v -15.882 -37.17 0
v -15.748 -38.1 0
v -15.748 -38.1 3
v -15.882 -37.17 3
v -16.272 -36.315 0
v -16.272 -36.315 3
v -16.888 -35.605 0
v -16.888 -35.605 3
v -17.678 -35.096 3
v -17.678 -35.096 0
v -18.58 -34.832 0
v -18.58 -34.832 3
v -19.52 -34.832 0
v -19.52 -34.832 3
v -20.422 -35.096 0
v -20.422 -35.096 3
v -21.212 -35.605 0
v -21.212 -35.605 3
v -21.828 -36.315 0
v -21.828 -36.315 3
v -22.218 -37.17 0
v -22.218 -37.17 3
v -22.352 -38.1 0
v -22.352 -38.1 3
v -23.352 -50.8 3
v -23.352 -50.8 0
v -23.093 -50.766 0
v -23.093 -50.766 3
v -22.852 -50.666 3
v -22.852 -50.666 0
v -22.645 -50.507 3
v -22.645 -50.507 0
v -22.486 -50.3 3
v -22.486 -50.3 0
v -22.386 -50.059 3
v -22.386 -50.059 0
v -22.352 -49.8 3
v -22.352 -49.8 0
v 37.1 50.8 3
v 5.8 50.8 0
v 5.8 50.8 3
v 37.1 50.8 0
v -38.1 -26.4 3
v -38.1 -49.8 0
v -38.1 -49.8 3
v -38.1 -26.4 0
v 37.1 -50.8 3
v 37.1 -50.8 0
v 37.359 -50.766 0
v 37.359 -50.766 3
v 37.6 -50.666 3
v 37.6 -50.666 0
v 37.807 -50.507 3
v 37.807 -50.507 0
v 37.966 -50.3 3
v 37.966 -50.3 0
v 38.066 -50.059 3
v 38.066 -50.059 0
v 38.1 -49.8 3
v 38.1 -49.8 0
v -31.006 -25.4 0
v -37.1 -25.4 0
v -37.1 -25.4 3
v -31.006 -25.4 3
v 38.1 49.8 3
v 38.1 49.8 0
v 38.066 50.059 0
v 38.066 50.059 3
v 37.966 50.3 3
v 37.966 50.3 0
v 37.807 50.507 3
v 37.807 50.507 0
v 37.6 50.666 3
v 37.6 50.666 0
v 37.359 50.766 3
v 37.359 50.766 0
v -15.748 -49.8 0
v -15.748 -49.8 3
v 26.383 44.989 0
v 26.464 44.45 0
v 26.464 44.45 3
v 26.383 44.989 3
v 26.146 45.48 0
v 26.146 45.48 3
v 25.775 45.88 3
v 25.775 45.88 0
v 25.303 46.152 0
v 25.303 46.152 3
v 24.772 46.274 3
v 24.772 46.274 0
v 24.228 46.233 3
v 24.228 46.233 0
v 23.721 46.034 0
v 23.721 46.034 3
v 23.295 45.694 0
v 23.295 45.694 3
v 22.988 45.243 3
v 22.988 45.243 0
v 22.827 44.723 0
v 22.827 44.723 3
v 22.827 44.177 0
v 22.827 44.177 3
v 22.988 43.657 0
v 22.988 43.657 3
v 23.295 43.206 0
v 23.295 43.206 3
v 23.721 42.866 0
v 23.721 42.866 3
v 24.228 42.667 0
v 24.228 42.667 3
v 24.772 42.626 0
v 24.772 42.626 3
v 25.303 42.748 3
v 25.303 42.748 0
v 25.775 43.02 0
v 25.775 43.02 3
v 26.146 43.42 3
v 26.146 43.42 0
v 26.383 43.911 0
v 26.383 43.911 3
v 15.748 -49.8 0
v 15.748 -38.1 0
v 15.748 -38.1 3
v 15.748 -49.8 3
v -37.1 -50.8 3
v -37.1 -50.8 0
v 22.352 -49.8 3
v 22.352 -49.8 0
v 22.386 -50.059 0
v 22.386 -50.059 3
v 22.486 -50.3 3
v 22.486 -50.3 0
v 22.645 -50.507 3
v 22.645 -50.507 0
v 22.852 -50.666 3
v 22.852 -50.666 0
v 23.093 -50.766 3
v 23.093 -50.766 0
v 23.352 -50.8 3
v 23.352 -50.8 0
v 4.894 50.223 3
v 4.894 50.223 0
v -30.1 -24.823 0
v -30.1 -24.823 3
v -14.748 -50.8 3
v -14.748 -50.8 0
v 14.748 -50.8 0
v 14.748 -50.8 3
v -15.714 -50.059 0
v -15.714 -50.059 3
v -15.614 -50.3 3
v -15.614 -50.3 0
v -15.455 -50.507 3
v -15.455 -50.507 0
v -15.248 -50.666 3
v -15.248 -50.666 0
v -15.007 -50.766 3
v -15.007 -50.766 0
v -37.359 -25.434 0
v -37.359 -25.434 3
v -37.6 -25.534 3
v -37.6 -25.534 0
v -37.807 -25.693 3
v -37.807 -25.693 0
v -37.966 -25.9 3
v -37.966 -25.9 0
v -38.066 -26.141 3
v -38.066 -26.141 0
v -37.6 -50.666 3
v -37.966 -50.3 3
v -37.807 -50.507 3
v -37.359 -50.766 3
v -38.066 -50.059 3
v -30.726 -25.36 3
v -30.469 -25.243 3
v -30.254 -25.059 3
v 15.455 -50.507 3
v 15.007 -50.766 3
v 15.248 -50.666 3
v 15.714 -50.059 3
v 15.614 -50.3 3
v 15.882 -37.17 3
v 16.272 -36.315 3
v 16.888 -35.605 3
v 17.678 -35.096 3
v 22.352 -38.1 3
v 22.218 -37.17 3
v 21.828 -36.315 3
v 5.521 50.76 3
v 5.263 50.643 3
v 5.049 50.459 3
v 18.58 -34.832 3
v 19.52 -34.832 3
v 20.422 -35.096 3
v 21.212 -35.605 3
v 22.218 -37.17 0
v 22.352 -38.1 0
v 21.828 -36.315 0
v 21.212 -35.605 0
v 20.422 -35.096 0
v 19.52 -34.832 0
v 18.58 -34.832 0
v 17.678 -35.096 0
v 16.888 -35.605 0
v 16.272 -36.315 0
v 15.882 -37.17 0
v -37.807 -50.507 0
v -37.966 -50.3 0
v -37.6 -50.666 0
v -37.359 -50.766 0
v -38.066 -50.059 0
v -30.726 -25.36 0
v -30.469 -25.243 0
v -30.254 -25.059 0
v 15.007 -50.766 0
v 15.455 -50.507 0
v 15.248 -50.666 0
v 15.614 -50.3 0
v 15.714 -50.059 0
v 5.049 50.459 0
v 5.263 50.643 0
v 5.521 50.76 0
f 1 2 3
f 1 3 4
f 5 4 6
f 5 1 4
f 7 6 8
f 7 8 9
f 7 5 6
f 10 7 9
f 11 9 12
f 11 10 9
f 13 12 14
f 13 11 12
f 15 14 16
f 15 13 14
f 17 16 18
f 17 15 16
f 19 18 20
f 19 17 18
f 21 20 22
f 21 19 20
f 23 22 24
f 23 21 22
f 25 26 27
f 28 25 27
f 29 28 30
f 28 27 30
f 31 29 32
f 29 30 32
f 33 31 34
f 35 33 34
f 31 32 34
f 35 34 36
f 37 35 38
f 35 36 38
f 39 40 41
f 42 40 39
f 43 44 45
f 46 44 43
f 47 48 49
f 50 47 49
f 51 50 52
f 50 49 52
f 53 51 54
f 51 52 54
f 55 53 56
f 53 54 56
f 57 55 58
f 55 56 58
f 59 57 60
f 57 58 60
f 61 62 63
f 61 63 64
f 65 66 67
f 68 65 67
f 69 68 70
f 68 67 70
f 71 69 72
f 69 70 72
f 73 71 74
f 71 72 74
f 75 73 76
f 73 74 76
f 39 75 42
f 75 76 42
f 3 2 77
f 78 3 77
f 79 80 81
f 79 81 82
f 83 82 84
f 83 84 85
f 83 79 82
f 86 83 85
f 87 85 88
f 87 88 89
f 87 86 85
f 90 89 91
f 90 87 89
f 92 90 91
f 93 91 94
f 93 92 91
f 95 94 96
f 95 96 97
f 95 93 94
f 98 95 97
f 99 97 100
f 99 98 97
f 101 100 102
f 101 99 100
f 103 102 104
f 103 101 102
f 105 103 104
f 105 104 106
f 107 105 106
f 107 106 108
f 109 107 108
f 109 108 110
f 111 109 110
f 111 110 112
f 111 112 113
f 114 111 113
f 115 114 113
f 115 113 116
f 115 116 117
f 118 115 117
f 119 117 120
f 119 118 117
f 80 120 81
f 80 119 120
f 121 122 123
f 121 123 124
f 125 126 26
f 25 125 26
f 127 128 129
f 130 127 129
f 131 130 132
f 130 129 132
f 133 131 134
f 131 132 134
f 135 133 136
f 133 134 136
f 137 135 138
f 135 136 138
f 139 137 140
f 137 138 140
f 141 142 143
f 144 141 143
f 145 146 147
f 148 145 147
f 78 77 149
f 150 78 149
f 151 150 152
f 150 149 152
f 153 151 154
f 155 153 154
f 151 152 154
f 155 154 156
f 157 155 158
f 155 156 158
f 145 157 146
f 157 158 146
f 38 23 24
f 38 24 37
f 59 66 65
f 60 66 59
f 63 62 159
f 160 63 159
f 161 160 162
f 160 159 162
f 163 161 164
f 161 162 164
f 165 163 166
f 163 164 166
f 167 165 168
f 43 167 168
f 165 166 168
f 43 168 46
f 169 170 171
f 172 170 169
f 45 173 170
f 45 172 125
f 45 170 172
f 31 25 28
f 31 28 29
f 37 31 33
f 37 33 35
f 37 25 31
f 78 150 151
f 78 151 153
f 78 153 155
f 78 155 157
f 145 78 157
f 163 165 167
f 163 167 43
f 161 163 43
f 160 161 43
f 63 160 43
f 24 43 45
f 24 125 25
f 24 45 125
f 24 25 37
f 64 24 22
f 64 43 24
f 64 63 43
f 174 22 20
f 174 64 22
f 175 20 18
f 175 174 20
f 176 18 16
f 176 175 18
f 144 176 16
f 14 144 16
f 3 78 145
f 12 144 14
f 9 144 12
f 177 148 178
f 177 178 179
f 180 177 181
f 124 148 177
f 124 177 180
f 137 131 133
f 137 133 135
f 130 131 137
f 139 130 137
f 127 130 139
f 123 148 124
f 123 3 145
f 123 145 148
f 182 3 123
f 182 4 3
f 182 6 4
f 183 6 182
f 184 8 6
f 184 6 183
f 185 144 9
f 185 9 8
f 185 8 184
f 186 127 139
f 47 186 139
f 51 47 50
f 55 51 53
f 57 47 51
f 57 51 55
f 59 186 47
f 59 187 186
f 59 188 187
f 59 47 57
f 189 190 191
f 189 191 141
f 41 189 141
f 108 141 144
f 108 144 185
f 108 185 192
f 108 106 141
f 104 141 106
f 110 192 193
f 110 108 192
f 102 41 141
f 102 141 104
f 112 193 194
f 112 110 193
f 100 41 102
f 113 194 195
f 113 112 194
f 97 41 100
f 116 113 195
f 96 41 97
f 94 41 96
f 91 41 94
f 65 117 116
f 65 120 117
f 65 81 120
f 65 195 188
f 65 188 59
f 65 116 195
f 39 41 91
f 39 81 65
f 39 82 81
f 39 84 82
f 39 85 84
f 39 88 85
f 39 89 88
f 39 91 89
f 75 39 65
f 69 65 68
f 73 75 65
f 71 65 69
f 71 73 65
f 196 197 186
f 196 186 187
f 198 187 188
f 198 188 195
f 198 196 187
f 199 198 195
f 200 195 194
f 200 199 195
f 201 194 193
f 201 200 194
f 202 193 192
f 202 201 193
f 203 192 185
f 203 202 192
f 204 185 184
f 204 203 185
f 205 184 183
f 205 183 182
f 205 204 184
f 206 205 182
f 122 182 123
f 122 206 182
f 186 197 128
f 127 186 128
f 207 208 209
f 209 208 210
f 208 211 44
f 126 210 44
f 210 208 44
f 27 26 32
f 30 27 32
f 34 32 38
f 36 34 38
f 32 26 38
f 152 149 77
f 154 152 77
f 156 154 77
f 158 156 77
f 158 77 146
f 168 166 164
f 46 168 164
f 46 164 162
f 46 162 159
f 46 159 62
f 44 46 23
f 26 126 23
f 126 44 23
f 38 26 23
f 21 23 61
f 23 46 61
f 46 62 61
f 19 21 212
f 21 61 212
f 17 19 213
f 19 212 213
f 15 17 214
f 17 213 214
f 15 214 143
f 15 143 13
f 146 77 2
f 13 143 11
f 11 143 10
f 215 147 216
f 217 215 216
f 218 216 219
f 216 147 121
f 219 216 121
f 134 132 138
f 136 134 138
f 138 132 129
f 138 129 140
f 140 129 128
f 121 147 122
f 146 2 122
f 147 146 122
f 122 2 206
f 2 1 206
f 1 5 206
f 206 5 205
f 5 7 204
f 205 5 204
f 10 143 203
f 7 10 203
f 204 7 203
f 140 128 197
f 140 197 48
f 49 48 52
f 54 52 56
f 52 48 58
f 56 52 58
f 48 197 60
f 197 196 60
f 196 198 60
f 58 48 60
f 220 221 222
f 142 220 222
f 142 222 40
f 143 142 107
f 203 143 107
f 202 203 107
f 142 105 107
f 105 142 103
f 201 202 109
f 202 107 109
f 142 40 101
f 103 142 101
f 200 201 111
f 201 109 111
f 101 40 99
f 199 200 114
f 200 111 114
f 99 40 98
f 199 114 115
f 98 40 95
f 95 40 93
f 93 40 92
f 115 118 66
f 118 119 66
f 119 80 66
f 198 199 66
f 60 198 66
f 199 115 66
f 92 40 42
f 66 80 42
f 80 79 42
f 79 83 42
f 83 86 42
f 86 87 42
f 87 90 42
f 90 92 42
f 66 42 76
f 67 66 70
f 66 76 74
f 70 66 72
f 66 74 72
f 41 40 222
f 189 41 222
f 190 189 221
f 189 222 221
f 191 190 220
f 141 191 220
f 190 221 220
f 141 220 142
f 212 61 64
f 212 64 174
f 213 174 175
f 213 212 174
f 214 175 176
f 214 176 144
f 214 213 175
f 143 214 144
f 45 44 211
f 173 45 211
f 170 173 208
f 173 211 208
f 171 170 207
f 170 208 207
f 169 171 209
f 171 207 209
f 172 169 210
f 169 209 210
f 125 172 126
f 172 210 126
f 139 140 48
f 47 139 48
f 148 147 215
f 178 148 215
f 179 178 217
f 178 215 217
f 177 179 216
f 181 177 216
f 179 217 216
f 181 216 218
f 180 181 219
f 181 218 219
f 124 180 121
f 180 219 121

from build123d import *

# Parameters (mm, degrees)
SKETCH_R  = 1.8288
PAD_DEPTH = 3


with BuildPart() as part:
    # Sketch → Pad (new body)
    with BuildSketch(Plane.XY):
        with BuildLine():
            ThreePointArc((5.800476, 50.8), (5.263177, 50.643391), (4.894168, 50.222618))
            Line((4.894168, 50.222618), (-30.1, -24.822618))
            ThreePointArc((-31.006308, -25.4), (-30.469008, -25.243391), (-30.1, -24.822618))
            Line((-37.1, -25.4), (-31.006308, -25.4))
            ThreePointArc((-37.1, -25.4), (-37.807107, -25.692893), (-38.1, -26.4))
            Line((-38.1, -49.8), (-38.1, -26.4))
            ThreePointArc((-38.1, -49.8), (-37.807107, -50.507107), (-37.1, -50.8))
            Line((-37.1, -50.8), (-23.352, -50.8))
            ThreePointArc((-23.352, -50.8), (-22.644893, -50.507107), (-22.352, -49.8))
            Line((-22.352, -38.1), (-22.352, -49.8))
            ThreePointArc((-15.748, -38.1), (-19.05, -34.798), (-22.352, -38.1))
            Line((-15.748, -38.1), (-15.748, -49.8))
            ThreePointArc((-15.748, -49.8), (-15.455107, -50.507107), (-14.748, -50.8))
            Line((-14.748, -50.8), (14.748, -50.8))
            ThreePointArc((14.748, -50.8), (15.455107, -50.507107), (15.748, -49.8))
            Line((15.748, -38.1), (15.748, -49.8))
            ThreePointArc((22.352, -38.1), (19.05, -34.798), (15.748, -38.1))
            Line((22.352, -38.1), (22.352, -49.8))
            ThreePointArc((22.352, -49.8), (22.644893, -50.507107), (23.352, -50.8))
            Line((23.352, -50.8), (37.1, -50.8))
            ThreePointArc((37.1, -50.8), (37.807107, -50.507107), (38.1, -49.8))
            Line((38.1, 49.8), (38.1, -49.8))
            ThreePointArc((38.1, 49.8), (37.807107, 50.507107), (37.1, 50.8))
            Line((5.800476, 50.8), (37.1, 50.8))
        make_face()
        with Locations((24.6352, 44.45)):
            Circle(SKETCH_R, mode=Mode.SUBTRACT)
    extrude(amount=PAD_DEPTH)


solid = part.part
